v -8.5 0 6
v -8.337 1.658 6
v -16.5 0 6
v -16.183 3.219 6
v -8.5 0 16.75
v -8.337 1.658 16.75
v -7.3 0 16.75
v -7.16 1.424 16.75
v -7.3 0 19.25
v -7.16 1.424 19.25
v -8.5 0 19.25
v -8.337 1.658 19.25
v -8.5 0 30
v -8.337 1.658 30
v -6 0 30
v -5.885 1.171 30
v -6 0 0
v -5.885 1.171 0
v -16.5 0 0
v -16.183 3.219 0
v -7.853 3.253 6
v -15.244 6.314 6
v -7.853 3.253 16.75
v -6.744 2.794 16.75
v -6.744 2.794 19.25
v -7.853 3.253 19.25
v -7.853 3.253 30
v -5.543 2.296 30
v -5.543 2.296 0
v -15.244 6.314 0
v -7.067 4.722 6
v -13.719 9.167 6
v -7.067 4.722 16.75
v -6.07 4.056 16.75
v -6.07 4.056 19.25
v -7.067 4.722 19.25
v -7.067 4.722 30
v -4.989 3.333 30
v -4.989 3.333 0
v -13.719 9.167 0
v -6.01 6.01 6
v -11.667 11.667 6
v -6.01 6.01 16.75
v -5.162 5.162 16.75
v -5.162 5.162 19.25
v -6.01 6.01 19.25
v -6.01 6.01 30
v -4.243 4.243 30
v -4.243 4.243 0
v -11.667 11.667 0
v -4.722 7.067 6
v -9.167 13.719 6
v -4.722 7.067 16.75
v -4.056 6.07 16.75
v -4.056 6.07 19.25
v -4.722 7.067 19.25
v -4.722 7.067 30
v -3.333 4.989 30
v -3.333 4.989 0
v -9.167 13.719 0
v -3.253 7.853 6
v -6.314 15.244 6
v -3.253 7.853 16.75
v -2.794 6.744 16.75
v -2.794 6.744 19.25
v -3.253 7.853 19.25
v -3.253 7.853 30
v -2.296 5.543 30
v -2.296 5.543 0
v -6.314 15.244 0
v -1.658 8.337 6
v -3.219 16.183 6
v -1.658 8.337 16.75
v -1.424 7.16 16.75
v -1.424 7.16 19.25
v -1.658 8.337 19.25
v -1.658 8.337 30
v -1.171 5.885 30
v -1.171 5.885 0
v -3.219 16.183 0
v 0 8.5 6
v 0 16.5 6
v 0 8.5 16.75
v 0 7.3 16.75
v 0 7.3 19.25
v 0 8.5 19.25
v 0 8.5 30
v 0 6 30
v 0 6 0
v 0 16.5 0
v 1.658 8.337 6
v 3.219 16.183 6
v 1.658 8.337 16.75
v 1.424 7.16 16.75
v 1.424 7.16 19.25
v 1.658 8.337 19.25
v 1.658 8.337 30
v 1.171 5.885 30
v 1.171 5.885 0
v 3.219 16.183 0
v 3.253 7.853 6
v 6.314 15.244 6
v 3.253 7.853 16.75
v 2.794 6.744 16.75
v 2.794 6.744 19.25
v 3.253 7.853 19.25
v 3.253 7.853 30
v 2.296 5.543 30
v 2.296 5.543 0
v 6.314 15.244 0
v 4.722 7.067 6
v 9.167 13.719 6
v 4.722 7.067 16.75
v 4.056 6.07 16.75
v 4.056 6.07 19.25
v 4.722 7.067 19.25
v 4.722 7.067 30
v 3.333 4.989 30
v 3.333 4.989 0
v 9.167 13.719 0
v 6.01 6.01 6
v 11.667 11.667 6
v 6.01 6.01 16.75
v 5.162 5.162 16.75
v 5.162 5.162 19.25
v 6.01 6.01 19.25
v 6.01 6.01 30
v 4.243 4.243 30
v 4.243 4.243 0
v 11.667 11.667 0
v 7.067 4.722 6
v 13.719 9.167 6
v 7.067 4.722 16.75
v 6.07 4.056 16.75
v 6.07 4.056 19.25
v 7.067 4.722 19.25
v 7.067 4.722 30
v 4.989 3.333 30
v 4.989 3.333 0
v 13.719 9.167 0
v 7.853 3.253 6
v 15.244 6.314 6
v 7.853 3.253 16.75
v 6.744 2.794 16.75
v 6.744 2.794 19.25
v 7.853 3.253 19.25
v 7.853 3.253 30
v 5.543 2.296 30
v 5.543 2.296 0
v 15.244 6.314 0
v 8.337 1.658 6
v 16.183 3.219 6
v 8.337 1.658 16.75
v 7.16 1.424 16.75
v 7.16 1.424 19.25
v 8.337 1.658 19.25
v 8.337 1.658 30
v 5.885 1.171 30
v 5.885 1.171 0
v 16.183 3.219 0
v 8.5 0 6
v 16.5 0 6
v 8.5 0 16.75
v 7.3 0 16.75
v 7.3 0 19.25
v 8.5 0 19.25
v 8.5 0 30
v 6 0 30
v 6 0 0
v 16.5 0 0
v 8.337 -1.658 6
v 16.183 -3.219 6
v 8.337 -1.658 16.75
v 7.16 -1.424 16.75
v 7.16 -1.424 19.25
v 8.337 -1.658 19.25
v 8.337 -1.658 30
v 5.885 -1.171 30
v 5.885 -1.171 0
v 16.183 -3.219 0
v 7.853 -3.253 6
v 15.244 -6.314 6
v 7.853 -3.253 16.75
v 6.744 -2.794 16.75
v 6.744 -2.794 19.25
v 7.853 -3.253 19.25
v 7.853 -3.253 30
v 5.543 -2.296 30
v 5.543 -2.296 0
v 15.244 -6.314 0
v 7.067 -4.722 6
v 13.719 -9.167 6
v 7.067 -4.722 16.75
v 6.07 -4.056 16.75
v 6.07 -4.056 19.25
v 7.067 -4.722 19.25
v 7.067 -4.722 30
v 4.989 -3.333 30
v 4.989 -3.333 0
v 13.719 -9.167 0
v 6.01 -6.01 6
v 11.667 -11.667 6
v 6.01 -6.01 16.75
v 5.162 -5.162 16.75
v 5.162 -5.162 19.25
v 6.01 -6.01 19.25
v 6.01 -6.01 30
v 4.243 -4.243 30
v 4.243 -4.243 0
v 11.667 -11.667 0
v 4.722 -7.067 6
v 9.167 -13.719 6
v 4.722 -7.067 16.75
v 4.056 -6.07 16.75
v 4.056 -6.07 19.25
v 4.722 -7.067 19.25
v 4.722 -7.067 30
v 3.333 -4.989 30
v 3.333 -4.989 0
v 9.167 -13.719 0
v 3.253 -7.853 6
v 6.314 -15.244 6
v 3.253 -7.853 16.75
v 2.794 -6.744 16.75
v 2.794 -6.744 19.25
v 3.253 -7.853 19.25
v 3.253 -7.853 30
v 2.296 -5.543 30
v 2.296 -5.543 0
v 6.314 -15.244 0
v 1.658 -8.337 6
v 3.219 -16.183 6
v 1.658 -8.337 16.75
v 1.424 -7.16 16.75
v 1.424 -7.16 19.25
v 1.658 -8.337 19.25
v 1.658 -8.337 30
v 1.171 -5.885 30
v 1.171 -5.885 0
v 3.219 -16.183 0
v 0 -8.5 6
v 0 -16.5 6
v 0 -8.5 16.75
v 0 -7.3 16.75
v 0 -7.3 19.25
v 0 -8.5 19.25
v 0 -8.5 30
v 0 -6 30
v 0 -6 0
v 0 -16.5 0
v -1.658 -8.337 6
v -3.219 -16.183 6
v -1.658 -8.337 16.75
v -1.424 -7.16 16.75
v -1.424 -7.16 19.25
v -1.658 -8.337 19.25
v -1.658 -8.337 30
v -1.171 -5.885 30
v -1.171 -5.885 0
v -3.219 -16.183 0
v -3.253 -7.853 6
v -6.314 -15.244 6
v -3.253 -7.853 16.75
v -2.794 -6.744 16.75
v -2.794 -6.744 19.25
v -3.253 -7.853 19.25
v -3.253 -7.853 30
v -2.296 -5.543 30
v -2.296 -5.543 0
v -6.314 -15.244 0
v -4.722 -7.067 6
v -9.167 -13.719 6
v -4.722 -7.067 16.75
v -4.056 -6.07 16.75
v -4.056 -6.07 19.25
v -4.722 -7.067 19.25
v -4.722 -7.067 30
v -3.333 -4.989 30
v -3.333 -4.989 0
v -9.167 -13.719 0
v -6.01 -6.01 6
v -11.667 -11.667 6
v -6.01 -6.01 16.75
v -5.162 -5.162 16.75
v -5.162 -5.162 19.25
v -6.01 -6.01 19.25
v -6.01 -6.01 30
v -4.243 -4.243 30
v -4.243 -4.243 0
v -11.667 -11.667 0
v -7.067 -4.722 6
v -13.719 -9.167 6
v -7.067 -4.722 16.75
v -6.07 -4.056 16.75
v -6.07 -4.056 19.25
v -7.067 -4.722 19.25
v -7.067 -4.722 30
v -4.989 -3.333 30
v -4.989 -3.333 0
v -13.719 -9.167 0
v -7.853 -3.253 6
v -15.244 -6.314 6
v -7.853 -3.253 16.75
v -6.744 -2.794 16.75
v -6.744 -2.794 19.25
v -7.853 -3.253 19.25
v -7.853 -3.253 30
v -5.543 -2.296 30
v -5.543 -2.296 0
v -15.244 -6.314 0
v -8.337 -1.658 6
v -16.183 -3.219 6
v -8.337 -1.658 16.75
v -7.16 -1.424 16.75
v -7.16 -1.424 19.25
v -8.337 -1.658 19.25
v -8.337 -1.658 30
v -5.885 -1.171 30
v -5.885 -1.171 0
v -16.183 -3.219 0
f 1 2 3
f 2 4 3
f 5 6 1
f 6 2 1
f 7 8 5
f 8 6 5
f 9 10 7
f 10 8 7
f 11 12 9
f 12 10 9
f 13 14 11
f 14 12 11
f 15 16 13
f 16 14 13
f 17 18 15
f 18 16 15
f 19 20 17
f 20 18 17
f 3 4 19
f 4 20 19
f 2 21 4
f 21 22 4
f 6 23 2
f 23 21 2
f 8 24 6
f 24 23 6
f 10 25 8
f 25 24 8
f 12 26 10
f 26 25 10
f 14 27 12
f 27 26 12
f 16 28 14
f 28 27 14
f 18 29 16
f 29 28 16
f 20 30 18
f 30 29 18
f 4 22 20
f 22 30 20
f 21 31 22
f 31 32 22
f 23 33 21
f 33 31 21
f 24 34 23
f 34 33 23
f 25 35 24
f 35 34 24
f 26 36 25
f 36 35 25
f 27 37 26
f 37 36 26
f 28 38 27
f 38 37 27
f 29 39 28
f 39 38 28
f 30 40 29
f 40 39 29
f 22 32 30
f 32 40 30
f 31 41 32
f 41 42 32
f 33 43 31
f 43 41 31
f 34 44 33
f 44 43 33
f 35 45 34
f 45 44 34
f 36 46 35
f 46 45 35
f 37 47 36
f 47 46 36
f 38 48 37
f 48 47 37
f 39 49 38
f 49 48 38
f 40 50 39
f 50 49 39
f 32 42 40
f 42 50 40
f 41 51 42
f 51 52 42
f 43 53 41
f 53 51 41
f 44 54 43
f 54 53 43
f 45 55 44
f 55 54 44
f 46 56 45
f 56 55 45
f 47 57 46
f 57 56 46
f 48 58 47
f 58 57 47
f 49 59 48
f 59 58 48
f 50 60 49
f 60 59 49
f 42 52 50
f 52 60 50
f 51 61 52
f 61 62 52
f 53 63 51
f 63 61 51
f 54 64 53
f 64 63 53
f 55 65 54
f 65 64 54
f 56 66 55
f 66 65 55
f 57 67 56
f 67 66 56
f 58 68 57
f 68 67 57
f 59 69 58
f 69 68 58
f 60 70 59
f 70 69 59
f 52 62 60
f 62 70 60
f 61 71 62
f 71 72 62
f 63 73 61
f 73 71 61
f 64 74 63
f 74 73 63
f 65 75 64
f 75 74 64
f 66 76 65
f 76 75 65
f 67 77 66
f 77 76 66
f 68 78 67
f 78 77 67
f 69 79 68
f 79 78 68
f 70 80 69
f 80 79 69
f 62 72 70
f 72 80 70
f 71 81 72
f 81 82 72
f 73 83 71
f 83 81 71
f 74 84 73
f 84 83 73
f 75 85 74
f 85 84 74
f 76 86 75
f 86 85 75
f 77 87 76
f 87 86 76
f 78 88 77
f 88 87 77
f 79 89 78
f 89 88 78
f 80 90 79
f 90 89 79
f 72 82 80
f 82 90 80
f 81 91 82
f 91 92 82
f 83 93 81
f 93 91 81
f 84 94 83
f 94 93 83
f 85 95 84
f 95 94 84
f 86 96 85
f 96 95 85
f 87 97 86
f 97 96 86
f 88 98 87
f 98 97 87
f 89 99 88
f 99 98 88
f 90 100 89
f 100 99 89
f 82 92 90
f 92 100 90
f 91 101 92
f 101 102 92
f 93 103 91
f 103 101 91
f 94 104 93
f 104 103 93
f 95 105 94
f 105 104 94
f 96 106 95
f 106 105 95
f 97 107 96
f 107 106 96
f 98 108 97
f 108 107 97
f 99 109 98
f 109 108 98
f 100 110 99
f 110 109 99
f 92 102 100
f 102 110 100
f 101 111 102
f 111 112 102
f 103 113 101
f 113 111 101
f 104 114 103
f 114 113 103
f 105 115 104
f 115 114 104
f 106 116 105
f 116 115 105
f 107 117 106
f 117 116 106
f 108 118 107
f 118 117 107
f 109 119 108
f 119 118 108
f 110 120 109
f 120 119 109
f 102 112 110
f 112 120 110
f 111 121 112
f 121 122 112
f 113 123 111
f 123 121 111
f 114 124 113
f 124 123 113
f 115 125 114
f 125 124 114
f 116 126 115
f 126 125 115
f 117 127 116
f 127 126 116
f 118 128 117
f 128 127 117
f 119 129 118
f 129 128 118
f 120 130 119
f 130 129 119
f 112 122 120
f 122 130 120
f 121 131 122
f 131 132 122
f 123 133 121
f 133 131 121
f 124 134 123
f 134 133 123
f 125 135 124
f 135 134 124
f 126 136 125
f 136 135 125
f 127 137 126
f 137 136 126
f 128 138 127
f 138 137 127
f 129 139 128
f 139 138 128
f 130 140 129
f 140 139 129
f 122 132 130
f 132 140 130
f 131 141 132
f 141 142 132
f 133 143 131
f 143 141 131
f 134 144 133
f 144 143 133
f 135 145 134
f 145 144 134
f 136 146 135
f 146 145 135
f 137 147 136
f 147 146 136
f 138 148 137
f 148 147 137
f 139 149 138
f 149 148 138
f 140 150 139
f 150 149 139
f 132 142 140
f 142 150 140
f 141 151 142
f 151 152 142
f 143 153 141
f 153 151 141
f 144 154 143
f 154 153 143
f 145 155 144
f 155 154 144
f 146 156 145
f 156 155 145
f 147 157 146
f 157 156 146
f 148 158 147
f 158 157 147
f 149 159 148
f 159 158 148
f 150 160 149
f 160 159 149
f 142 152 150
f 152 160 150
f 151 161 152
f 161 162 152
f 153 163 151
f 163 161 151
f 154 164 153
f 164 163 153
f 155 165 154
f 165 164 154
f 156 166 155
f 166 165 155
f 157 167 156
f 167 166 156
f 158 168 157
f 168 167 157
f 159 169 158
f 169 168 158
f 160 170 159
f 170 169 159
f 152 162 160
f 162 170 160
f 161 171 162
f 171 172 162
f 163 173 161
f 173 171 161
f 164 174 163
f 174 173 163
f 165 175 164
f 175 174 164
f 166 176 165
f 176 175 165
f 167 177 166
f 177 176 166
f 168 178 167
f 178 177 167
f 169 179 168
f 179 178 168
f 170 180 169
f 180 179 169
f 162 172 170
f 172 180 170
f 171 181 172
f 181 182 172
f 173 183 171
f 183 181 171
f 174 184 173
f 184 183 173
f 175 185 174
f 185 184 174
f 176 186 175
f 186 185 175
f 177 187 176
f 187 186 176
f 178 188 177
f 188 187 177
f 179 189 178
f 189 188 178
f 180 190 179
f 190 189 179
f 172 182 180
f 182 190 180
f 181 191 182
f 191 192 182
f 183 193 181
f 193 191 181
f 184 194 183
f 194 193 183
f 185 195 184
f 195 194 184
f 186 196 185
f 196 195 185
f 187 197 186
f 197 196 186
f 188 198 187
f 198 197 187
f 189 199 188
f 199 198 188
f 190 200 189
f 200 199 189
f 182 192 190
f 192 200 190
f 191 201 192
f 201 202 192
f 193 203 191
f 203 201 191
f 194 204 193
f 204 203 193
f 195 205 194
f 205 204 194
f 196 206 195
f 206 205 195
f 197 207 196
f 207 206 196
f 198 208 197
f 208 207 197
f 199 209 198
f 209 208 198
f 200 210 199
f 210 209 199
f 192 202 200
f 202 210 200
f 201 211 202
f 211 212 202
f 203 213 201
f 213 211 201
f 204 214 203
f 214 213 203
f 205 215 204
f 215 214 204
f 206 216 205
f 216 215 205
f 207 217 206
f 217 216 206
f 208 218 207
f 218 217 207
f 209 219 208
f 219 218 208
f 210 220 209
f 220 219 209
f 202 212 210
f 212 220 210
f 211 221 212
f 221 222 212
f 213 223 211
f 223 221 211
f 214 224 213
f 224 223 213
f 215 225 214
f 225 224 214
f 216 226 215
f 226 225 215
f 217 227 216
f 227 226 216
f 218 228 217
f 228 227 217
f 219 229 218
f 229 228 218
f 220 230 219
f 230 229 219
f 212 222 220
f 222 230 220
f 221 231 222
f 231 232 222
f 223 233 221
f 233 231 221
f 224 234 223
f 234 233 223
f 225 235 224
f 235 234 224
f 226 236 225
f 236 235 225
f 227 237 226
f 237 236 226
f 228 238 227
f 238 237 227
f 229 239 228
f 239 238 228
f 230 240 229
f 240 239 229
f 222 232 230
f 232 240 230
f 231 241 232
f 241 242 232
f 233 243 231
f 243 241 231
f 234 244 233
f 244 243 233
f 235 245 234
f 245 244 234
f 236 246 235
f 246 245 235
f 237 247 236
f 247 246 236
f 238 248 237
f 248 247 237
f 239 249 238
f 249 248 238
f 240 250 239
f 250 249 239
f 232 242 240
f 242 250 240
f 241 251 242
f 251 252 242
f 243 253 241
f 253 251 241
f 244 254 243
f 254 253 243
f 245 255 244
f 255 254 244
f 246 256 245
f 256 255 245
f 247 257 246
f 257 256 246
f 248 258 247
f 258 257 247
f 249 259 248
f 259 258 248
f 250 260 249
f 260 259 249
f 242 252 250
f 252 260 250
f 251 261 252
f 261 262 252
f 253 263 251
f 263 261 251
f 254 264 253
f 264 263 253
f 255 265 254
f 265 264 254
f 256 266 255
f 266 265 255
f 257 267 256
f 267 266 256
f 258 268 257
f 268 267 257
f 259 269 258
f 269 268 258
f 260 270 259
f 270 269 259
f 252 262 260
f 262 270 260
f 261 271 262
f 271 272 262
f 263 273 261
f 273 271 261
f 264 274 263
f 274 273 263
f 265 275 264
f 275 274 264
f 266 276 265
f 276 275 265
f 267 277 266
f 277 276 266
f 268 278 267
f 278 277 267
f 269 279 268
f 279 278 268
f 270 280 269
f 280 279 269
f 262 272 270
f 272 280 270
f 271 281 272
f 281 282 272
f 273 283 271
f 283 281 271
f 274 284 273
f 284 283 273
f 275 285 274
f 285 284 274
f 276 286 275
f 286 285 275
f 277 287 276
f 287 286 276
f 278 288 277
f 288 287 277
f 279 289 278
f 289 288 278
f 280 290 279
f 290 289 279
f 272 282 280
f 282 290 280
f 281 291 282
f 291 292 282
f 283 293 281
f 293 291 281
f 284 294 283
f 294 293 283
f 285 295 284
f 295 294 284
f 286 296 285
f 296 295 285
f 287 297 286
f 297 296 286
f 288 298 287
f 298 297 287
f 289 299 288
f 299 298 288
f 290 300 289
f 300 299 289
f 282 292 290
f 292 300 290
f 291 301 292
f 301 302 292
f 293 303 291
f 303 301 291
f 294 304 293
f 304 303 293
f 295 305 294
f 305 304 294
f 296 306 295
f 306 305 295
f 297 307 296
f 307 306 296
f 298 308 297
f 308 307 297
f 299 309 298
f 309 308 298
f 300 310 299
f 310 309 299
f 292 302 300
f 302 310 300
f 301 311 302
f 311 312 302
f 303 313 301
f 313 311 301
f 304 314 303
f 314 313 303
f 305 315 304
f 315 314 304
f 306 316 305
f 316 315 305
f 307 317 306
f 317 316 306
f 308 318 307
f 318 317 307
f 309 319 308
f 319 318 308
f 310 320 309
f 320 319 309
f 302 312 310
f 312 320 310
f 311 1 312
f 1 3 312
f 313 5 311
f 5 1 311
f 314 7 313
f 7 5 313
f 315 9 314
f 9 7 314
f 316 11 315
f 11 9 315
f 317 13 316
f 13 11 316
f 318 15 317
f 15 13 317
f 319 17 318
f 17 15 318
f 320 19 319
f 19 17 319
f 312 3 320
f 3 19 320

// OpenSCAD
$fn = 32;

// ----------------------------------------------------------------------
// Grooved revolve: flanged, bore R6
// ----------------------------------------------------------------------

// --- parameters (mm) ---
bore_r = 6;               // bore radius
outer_r = 8.5;            // outer radius of the body
total_h = 30;             // overall height, Z
wall = 2.5;               // radial wall thickness
groove_w = 2.5;           // groove width
groove_d = 1.2;           // groove depth
grooves = 1;              // number of outer grooves
flange_r = 16.5;          // flange radius
flange_h = 6;             // flange height

bbox_x = 2 * flange_r;  // full diameter
bore_d = 2 * bore_r;  // bore diameter
body_d = 2 * outer_r;  // body diameter
flange_d = 2 * flange_r;  // flange diameter
revolve_angle = 360;  // full turn around the Z axis

profile = [[6, 0], [8.5, 0], [16.5, 0], [16.5, 6], [8.5, 6], [8.5, 16.75], [7.3, 16.75], [7.3, 19.25], [8.5, 19.25], [8.5, 30], [6, 30]];  // primary outline, 11 points, counter clockwise

// --- the one profile operation ---
rotate_extrude(angle = revolve_angle) polygon(points = profile);
